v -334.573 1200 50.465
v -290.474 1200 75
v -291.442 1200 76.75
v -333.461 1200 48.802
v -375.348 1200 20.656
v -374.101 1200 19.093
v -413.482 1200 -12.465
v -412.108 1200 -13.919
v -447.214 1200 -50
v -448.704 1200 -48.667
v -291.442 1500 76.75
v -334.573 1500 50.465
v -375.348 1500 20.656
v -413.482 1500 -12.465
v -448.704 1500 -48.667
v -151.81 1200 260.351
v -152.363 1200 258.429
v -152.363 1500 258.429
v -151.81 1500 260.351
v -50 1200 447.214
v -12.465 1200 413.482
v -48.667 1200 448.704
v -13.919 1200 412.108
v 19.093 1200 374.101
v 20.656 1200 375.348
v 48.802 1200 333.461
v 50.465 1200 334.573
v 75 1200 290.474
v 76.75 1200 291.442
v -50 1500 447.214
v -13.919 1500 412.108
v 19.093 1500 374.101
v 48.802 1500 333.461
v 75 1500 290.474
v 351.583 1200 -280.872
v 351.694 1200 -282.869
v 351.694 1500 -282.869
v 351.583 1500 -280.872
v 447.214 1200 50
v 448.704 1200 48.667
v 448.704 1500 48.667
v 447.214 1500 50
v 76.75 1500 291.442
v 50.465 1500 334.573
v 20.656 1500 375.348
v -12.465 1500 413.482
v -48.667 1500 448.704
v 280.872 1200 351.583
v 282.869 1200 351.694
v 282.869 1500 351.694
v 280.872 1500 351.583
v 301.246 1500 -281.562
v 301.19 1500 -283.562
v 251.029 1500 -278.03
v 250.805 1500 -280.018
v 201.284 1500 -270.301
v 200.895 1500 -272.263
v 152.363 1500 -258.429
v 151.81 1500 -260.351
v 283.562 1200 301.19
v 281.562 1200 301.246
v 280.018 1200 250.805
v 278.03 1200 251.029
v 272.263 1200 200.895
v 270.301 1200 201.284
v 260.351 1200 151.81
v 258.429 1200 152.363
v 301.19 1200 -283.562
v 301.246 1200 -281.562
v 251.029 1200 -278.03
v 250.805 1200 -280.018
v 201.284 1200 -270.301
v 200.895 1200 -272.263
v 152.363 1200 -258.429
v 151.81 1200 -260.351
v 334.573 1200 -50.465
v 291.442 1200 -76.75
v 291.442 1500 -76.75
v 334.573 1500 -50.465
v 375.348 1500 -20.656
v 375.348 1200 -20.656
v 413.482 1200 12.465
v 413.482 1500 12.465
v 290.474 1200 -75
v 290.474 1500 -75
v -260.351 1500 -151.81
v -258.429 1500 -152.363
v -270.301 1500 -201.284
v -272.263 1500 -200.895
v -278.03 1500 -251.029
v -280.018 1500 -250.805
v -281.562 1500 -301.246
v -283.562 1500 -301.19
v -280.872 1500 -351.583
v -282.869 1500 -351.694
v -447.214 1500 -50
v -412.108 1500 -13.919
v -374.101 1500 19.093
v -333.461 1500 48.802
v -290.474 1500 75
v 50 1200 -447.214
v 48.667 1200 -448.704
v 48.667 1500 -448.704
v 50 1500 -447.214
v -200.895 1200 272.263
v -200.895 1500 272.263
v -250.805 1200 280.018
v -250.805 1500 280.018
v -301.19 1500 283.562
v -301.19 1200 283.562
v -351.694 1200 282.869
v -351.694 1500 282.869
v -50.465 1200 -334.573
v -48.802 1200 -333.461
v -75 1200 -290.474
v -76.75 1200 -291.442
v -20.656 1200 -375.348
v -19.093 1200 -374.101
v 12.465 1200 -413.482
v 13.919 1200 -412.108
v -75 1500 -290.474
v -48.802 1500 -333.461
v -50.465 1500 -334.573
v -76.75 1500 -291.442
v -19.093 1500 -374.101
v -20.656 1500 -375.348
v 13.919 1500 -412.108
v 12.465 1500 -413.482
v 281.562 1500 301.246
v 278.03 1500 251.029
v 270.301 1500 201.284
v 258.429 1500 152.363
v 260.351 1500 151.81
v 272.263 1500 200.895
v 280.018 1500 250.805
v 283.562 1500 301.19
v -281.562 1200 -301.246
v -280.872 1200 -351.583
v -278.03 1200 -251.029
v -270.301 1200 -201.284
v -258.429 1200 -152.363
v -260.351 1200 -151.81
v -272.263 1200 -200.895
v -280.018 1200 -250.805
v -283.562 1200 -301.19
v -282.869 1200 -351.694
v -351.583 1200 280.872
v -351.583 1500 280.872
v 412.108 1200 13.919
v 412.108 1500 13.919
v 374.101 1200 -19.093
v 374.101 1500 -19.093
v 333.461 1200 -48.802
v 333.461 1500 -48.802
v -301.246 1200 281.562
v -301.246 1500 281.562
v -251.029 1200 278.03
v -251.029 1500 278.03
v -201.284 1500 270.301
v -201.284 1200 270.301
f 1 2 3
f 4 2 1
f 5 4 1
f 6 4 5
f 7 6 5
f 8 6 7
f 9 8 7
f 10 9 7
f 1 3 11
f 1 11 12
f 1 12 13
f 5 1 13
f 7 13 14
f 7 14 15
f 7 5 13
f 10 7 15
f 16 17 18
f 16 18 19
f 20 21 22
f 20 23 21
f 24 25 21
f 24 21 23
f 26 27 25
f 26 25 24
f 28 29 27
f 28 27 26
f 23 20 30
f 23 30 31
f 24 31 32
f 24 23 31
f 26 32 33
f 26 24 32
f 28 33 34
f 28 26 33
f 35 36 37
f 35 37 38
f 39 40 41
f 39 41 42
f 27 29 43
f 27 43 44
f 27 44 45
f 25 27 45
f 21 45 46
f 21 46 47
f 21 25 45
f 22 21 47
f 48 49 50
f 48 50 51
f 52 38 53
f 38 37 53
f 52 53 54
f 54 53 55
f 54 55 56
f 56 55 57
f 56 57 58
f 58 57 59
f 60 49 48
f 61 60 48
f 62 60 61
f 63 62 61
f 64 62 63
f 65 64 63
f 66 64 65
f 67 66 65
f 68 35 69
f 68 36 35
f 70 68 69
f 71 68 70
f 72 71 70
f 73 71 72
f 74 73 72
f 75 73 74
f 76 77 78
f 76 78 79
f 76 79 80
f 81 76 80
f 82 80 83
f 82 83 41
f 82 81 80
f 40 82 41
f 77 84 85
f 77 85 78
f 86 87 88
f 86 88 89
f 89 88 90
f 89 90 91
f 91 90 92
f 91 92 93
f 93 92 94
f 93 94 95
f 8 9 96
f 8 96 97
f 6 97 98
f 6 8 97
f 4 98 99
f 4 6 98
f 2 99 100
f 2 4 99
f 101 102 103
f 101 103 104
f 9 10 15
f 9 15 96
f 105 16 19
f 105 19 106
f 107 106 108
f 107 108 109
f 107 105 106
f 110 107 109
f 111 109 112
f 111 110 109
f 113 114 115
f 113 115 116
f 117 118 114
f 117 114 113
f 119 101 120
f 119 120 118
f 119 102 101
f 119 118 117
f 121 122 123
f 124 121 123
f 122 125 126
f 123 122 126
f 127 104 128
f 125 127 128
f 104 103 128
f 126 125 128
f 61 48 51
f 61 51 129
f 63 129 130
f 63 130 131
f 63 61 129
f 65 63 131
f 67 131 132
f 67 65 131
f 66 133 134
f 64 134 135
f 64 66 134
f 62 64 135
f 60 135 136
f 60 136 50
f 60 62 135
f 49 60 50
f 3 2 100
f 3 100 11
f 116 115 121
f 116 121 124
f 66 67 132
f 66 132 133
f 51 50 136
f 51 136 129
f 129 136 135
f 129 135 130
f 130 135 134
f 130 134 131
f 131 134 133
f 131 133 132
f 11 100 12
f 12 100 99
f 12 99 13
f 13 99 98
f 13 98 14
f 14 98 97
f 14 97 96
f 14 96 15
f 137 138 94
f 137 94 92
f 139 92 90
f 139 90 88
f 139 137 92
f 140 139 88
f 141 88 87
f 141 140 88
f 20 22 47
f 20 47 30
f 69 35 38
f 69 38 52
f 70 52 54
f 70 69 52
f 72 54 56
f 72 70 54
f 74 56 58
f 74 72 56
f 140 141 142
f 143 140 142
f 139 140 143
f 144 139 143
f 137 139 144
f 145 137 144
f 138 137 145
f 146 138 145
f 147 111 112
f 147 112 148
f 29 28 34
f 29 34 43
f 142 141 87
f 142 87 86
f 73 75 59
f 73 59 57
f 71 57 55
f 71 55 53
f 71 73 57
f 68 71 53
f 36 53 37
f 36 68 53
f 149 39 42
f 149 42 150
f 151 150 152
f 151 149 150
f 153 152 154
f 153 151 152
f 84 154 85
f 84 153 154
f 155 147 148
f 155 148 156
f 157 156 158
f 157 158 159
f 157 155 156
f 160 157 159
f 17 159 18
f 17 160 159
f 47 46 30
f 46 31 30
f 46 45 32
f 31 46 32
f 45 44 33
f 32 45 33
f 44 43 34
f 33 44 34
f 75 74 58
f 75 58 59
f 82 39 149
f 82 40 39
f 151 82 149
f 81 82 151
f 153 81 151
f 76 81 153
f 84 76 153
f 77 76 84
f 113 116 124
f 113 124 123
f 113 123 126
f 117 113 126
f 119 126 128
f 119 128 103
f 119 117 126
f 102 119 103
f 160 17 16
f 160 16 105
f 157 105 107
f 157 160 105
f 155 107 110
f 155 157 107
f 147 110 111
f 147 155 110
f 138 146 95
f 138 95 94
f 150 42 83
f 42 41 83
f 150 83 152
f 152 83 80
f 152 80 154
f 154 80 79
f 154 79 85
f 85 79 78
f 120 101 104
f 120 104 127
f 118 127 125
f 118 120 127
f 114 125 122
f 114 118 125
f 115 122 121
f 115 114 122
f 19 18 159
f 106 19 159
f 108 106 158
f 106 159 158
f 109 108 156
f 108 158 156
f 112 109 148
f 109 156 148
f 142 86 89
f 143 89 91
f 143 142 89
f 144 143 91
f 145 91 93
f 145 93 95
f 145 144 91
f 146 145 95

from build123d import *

# Parameters (mm, degrees)
EXTRUDE_THIN3_DEPTH   = 300
EXTRUDE_THIN3_2_DEPTH = 300
EXTRUDE_THIN3_3_DEPTH = 300
EXTRUDE_THIN3_4_DEPTH = 300
EXTRUDE_THIN3_5_DEPTH = 300
EXTRUDE_THIN3_6_DEPTH = 300
EXTRUDE_THIN3_7_DEPTH = 300
EXTRUDE_THIN3_8_DEPTH = 300


with BuildPart() as part:
    # Sketch1 → Extrude-Thin3 (new body)
    with BuildSketch(Plane(origin=(0, 1200, 0), x_dir=(1, 0, 0), z_dir=(0, 1, 0))):
        with BuildLine():
            ThreePointArc((50, 447.2135955), (-19.09284232, 374.101463889), (-75, 290.473750966))
            Line((-75, 290.473750966), (-76.75, 291.441996802))
            ThreePointArc((-76.75, 291.441996802), (-20.656485128, 375.348468769), (48.666666667, 448.704307485))
            Line((48.666666667, 448.704307485), (50, 447.2135955))
        make_face()
    extrude(amount=EXTRUDE_THIN3_DEPTH)


with BuildPart() as body_2:
    # Sketch1 → Extrude-Thin3 2 (new body)
    with BuildSketch(Plane(origin=(0, 1200, 0), x_dir=(1, 0, 0), z_dir=(0, 1, 0))):
        with BuildLine():
            ThreePointArc((351.583105076, 280.872426957), (251.029003691, 278.030360244), (152.362950476, 258.428967653))
            Line((152.362950476, 258.428967653), (151.810166805, 260.351057717))
            ThreePointArc((151.810166805, 260.351057717), (250.805106865, 280.017788284), (351.694388588, 282.869328552))
            Line((351.694388588, 282.869328552), (351.583105076, 280.872426957))
        make_face()
    extrude(amount=EXTRUDE_THIN3_2_DEPTH)


with BuildPart() as body_3:
    # Sketch1 → Extrude-Thin3 3 (new body)
    with BuildSketch(Plane(origin=(0, 1200, 0), x_dir=(1, 0, 0), z_dir=(0, 1, 0))):
        with BuildLine():
            ThreePointArc((447.2135955, -50), (374.101463889, 19.09284232), (290.473750966, 75))
            Line((290.473750966, 75), (291.441996802, 76.75))
            ThreePointArc((291.441996802, 76.75), (375.348468769, 20.656485128), (448.704307485, -48.666666667))
            Line((448.704307485, -48.666666667), (447.2135955, -50))
        make_face()
    extrude(amount=EXTRUDE_THIN3_3_DEPTH)


with BuildPart() as body_4:
    # Sketch1 → Extrude-Thin3 4 (new body)
    with BuildSketch(Plane(origin=(0, 1200, 0), x_dir=(1, 0, 0), z_dir=(0, 1, 0))):
        with BuildLine():
            ThreePointArc((280.872426958, -351.583105076), (278.030360245, -251.029003691), (258.428967653, -152.362950475))
            Line((258.428967653, -152.362950475), (260.351057717, -151.810166805))
            ThreePointArc((260.351057717, -151.810166805), (280.017788284, -250.805106865), (282.869328553, -351.694388588))
            Line((282.869328553, -351.694388588), (280.872426958, -351.583105076))
        make_face()
    extrude(amount=EXTRUDE_THIN3_4_DEPTH)


with BuildPart() as body_5:
    # Sketch1 → Extrude-Thin3 5 (new body)
    with BuildSketch(Plane(origin=(0, 1200, 0), x_dir=(1, 0, 0), z_dir=(0, 1, 0))):
        with BuildLine():
            ThreePointArc((-50, -447.2135955), (19.09284232, -374.101463889), (75, -290.473750966))
            Line((75, -290.473750966), (76.75, -291.441996802))
            ThreePointArc((76.75, -291.441996802), (20.656485128, -375.348468769), (-48.666666667, -448.704307485))
            Line((-48.666666667, -448.704307485), (-50, -447.2135955))
        make_face()
    extrude(amount=EXTRUDE_THIN3_5_DEPTH)


with BuildPart() as body_6:
    # Sketch1 → Extrude-Thin3 6 (new body)
    with BuildSketch(Plane(origin=(0, 1200, 0), x_dir=(1, 0, 0), z_dir=(0, 1, 0))):
        with BuildLine():
            ThreePointArc((-351.583105076, -280.872426958), (-251.029003691, -278.030360245), (-152.362950475, -258.428967653))
            Line((-152.362950475, -258.428967653), (-151.810166805, -260.351057717))
            ThreePointArc((-151.810166805, -260.351057717), (-250.805106865, -280.017788284), (-351.694388588, -282.869328552))
            Line((-351.694388588, -282.869328552), (-351.583105076, -280.872426958))
        make_face()
    extrude(amount=EXTRUDE_THIN3_6_DEPTH)


with BuildPart() as body_7:
    # Sketch1 → Extrude-Thin3 7 (new body)
    with BuildSketch(Plane(origin=(0, 1200, 0), x_dir=(1, 0, 0), z_dir=(0, 1, 0))):
        with BuildLine():
            ThreePointArc((-447.2135955, 50), (-374.101463889, -19.09284232), (-290.473750966, -75))
            Line((-290.473750966, -75), (-291.441996802, -76.75))
            ThreePointArc((-291.441996802, -76.75), (-375.348468769, -20.656485128), (-448.704307485, 48.666666667))
            Line((-448.704307485, 48.666666667), (-447.2135955, 50))
        make_face()
    extrude(amount=EXTRUDE_THIN3_7_DEPTH)


with BuildPart() as body_8:
    # Sketch1 → Extrude-Thin3 8 (new body)
    with BuildSketch(Plane(origin=(0, 1200, 0), x_dir=(1, 0, 0), z_dir=(0, 1, 0))):
        with BuildLine():
            ThreePointArc((-280.872426958, 351.583105076), (-278.030360245, 251.029003691), (-258.428967653, 152.362950475))
            Line((-258.428967653, 152.362950475), (-260.351057717, 151.810166805))
            ThreePointArc((-260.351057717, 151.810166805), (-280.017788284, 250.805106865), (-282.869328553, 351.694388588))
            Line((-282.869328553, 351.694388588), (-280.872426958, 351.583105076))
        make_face()
    extrude(amount=EXTRUDE_THIN3_8_DEPTH)


solid = Compound([part.part, body_2.part, body_3.part, body_4.part, body_5.part, body_6.part, body_7.part, body_8.part])
